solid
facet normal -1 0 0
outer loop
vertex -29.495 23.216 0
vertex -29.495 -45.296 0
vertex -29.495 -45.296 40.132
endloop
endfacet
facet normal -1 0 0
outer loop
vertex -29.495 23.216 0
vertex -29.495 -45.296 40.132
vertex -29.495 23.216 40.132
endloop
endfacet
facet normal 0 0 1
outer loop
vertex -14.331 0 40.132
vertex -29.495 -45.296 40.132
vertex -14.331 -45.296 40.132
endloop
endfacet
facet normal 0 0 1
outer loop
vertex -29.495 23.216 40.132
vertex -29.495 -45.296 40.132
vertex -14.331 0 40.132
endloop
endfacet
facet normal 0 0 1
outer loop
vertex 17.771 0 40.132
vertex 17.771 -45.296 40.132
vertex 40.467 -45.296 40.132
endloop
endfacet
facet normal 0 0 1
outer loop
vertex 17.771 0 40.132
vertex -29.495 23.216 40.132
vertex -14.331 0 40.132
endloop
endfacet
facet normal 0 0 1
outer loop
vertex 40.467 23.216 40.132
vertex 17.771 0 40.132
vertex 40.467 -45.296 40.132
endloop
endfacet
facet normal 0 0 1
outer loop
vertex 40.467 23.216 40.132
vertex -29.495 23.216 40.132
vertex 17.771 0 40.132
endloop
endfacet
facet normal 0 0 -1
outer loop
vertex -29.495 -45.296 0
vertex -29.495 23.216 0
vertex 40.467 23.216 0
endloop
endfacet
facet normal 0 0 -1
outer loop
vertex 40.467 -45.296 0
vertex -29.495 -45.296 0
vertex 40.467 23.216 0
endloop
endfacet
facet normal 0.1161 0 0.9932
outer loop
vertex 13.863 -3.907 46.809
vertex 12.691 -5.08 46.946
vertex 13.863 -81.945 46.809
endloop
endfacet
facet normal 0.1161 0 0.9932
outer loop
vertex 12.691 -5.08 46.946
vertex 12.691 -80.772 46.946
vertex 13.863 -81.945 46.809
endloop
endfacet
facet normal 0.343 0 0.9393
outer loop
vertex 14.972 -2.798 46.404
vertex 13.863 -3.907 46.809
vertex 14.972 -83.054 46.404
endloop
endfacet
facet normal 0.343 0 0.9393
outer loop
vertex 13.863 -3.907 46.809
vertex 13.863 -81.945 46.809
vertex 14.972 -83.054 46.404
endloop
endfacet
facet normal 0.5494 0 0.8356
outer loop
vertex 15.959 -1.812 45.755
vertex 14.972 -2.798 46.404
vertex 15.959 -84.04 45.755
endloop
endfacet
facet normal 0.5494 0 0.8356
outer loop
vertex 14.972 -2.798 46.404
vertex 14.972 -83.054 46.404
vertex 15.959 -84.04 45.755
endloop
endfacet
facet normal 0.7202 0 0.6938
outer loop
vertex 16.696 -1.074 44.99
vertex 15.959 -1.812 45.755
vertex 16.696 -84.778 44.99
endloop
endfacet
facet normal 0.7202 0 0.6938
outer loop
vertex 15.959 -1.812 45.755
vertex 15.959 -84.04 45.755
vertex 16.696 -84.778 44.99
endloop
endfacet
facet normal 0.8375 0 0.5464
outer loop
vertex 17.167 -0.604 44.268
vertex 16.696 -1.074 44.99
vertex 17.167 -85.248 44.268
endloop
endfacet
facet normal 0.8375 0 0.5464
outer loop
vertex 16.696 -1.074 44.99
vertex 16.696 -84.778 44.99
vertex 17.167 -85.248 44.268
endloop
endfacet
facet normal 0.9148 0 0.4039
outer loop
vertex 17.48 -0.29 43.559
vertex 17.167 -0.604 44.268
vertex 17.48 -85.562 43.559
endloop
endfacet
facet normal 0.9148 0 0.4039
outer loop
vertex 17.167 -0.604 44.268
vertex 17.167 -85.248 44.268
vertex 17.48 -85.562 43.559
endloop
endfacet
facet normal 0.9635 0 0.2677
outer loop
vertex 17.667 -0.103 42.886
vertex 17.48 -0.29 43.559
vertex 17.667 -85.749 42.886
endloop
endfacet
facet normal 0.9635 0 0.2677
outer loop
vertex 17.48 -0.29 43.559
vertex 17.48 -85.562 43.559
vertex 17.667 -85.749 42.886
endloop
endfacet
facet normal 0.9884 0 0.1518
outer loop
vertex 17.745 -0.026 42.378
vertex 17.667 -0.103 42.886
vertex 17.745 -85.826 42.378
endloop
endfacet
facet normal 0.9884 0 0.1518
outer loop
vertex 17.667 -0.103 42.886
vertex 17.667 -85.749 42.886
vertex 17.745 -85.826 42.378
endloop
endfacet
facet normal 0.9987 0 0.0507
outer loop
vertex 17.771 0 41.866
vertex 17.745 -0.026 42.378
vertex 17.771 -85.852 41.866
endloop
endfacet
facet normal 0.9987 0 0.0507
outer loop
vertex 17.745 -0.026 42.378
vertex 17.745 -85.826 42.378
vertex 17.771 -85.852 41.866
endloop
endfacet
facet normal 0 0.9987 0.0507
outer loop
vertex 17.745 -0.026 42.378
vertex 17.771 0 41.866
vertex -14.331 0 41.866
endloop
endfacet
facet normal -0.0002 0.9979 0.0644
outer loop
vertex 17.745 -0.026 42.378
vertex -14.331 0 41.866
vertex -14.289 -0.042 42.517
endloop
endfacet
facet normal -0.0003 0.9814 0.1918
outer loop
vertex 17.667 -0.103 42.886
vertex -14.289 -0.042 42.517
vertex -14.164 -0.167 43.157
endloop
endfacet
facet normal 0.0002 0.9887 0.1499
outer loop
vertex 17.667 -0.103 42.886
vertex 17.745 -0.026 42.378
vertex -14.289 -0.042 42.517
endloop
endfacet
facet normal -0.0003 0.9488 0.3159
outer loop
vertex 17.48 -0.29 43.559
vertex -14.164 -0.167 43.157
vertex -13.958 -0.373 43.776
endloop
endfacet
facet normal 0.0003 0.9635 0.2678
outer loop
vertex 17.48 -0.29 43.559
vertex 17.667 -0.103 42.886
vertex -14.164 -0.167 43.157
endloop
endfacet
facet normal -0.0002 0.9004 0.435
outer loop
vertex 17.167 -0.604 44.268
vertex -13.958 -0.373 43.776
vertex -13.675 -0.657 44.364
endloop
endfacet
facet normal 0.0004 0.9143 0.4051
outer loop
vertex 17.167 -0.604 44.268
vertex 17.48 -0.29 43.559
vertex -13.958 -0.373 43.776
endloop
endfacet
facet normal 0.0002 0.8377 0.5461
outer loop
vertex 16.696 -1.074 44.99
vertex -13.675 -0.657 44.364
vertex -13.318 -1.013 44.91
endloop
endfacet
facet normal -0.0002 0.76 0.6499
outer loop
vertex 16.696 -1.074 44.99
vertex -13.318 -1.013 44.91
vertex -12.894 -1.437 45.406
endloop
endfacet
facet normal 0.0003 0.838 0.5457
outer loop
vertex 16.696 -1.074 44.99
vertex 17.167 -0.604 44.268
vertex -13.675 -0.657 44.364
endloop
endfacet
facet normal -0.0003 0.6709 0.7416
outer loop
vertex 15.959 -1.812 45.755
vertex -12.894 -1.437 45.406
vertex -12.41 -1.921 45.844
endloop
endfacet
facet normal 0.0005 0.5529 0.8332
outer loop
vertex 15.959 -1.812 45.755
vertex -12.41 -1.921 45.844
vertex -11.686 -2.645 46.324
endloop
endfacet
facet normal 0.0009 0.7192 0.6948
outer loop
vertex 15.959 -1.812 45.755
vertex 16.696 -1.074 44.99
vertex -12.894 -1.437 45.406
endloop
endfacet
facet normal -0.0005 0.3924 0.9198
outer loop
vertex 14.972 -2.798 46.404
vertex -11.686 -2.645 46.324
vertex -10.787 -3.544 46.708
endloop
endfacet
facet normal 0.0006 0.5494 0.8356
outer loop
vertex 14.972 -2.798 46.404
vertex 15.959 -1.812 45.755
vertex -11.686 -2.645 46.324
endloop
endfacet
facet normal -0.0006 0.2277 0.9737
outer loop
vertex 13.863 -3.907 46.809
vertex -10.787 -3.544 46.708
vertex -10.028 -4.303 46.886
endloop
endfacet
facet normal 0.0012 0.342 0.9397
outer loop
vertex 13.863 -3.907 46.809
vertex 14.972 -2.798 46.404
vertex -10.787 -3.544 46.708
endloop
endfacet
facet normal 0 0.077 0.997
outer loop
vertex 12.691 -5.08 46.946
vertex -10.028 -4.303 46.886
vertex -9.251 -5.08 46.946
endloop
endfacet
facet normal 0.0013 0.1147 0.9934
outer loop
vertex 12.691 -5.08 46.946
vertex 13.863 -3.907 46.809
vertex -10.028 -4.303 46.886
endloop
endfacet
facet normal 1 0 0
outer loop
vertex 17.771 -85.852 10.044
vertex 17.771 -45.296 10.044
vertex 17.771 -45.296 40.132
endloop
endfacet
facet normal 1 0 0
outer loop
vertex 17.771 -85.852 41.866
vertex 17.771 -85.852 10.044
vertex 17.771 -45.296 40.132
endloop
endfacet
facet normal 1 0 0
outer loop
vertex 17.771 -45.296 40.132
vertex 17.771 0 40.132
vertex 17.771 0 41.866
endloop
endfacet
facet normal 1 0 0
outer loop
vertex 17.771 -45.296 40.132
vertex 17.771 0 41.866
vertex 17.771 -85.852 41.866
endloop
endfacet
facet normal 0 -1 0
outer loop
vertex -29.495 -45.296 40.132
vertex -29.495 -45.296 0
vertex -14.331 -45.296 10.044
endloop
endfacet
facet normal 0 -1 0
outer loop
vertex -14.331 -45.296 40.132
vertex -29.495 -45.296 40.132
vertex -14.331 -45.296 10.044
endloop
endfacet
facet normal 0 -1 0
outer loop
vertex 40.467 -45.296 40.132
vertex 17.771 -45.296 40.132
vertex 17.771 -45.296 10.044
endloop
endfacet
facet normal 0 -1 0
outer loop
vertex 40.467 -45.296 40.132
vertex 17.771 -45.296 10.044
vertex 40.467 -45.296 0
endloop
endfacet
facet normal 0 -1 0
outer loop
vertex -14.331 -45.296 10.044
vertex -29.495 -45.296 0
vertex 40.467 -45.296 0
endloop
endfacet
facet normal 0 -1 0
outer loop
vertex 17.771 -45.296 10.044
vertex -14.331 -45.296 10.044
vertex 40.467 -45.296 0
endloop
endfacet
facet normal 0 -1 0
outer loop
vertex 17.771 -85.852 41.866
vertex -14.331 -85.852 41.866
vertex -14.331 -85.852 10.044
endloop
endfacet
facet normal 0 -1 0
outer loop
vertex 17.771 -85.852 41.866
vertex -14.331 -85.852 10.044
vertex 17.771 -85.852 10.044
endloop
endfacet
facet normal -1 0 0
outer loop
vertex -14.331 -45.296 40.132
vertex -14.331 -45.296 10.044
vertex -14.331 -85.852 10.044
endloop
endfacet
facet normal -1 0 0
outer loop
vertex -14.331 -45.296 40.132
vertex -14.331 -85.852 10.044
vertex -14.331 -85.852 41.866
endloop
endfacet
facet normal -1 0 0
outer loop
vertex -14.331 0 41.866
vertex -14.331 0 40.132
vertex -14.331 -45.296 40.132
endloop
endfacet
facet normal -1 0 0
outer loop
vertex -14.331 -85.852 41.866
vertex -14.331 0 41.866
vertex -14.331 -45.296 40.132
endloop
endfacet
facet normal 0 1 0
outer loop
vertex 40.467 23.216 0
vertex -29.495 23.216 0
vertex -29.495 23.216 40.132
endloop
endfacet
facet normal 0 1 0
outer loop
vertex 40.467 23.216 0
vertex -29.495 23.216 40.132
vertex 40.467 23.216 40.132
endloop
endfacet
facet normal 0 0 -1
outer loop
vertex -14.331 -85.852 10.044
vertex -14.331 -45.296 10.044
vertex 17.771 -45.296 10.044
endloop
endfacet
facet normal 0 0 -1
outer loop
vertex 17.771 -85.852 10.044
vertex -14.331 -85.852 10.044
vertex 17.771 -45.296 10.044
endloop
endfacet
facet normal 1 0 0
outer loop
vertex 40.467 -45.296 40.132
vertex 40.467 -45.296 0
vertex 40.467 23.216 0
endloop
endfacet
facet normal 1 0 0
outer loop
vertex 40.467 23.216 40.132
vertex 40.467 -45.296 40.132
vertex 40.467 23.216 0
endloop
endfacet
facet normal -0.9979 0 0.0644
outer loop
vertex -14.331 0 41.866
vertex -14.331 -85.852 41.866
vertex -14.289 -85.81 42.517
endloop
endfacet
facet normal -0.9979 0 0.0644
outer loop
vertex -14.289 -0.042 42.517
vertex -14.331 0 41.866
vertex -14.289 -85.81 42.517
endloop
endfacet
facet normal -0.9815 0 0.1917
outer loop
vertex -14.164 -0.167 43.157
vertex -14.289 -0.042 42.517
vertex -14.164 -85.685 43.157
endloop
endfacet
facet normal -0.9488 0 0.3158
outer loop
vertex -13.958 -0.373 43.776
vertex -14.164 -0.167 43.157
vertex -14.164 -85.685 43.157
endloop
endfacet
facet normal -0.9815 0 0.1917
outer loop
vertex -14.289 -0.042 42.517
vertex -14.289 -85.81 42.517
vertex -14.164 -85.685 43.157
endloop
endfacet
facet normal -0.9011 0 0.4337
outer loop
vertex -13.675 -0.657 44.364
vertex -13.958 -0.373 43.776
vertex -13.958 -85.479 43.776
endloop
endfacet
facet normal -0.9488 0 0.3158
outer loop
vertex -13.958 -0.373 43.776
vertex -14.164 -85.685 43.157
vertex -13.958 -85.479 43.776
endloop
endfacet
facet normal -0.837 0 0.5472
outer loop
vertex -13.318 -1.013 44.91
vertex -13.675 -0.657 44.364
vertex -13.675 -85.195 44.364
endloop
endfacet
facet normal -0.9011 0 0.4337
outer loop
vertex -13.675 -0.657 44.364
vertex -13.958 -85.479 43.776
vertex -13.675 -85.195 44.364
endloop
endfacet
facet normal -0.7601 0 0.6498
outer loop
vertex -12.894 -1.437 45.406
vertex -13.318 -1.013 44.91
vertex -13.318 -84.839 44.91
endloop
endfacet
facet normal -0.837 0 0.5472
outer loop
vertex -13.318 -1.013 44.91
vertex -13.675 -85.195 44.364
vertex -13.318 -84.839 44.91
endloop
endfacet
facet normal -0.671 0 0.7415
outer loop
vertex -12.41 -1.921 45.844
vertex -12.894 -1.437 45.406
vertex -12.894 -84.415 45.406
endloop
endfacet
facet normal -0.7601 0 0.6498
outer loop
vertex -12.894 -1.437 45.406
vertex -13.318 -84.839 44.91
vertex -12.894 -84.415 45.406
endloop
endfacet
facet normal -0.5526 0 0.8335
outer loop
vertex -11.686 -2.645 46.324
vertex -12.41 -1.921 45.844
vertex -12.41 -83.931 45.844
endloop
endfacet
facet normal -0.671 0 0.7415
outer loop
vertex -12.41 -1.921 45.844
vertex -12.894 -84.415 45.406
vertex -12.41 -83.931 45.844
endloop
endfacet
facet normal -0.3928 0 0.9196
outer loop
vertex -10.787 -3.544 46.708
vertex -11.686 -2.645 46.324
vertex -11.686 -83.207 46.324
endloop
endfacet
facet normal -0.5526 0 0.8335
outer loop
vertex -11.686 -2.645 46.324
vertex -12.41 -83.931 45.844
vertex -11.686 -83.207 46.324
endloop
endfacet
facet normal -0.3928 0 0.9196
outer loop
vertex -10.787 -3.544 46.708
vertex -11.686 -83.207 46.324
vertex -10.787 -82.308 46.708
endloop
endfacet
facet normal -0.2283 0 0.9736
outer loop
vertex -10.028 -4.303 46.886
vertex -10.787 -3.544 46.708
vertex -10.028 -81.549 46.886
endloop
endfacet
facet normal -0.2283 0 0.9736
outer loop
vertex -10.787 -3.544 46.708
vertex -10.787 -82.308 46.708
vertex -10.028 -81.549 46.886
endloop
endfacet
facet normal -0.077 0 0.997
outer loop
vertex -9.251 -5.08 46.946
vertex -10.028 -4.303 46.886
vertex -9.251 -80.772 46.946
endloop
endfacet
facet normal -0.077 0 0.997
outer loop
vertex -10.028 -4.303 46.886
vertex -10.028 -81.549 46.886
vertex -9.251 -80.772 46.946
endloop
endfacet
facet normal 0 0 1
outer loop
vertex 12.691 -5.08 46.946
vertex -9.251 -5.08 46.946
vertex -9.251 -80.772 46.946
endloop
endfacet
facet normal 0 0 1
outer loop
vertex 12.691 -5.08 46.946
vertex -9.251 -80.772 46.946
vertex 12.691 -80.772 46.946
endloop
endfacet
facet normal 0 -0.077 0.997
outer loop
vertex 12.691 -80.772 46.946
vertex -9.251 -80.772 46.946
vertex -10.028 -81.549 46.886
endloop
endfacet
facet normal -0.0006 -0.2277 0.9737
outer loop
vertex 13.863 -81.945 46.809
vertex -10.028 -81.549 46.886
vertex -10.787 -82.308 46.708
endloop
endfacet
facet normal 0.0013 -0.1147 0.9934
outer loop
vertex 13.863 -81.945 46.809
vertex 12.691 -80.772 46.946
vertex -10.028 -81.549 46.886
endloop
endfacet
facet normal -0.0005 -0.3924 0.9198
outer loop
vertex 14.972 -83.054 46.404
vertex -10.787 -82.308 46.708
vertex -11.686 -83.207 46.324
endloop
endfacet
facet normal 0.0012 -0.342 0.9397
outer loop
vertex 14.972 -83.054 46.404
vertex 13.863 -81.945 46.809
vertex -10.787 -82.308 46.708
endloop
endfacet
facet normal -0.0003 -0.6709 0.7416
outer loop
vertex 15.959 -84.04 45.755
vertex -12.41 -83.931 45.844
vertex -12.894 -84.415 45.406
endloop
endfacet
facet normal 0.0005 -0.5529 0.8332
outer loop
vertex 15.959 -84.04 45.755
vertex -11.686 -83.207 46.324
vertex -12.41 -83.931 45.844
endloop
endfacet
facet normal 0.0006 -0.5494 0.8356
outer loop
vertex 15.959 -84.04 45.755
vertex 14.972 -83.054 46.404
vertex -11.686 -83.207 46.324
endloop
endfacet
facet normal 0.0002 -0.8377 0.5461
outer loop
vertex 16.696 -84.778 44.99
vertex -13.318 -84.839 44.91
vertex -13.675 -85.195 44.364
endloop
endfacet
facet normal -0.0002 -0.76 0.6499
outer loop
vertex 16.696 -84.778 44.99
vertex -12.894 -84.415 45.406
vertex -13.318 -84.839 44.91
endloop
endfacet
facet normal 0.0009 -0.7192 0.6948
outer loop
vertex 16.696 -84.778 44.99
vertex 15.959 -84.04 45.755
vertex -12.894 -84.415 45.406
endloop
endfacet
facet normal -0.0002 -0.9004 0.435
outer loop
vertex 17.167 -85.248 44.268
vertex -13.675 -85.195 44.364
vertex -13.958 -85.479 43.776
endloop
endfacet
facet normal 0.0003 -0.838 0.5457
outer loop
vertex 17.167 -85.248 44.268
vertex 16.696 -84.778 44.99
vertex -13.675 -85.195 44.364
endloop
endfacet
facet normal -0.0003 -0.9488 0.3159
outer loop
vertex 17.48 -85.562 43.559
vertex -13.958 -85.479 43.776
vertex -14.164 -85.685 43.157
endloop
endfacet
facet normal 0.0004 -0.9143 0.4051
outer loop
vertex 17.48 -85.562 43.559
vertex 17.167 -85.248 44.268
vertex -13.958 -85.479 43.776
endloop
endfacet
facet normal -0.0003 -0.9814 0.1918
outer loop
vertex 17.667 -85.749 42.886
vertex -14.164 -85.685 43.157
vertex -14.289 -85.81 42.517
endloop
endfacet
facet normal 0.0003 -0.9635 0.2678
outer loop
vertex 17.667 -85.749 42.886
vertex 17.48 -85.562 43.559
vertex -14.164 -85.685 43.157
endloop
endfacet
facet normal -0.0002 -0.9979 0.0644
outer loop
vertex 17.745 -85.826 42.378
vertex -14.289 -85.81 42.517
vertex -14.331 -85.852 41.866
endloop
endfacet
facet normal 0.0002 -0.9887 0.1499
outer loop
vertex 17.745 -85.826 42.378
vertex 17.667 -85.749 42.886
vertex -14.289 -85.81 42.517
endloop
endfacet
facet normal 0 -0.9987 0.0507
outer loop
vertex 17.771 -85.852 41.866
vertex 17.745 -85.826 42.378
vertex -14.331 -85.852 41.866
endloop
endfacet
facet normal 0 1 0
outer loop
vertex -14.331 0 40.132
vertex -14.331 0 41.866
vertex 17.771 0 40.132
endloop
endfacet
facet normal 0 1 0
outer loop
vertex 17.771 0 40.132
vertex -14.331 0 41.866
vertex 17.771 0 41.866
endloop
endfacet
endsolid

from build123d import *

# Parameters (mm, degrees)
F0_W     = 69.961674
F0_H     = 68.511577
F1_DEPTH = 40.132
F2_W     = 32.101594
F2_H     = 36.901384
F3_DEPTH = 85.852
F4_R     = 5.08


with BuildPart() as f1:
    # F0 (on Top) → F1 (new body)
    with BuildSketch(Plane.XY):
        with Locations((5.486086, -11.040198)):
            Rectangle(F0_W, F0_H)
    extrude(amount=F1_DEPTH)

    # F2 (on Front) → F3 (join)
    with BuildSketch(Plane.XZ):
        with Locations((1.719728, 28.49517)):
            Rectangle(F2_W, F2_H)
    extrude(amount=F3_DEPTH)

    # F4
    f4_edges = [f1.edges().sort_by_distance(p)[0] for p in [
        (17.770525, -42.926, 46.945862),
        (-14.331069, -42.926, 46.945862),
        (1.719728, 0, 46.945862),
        (1.719728, -85.852, 46.945862),
    ]]
    fillet(f4_edges, radius=F4_R)


solid = f1.part
